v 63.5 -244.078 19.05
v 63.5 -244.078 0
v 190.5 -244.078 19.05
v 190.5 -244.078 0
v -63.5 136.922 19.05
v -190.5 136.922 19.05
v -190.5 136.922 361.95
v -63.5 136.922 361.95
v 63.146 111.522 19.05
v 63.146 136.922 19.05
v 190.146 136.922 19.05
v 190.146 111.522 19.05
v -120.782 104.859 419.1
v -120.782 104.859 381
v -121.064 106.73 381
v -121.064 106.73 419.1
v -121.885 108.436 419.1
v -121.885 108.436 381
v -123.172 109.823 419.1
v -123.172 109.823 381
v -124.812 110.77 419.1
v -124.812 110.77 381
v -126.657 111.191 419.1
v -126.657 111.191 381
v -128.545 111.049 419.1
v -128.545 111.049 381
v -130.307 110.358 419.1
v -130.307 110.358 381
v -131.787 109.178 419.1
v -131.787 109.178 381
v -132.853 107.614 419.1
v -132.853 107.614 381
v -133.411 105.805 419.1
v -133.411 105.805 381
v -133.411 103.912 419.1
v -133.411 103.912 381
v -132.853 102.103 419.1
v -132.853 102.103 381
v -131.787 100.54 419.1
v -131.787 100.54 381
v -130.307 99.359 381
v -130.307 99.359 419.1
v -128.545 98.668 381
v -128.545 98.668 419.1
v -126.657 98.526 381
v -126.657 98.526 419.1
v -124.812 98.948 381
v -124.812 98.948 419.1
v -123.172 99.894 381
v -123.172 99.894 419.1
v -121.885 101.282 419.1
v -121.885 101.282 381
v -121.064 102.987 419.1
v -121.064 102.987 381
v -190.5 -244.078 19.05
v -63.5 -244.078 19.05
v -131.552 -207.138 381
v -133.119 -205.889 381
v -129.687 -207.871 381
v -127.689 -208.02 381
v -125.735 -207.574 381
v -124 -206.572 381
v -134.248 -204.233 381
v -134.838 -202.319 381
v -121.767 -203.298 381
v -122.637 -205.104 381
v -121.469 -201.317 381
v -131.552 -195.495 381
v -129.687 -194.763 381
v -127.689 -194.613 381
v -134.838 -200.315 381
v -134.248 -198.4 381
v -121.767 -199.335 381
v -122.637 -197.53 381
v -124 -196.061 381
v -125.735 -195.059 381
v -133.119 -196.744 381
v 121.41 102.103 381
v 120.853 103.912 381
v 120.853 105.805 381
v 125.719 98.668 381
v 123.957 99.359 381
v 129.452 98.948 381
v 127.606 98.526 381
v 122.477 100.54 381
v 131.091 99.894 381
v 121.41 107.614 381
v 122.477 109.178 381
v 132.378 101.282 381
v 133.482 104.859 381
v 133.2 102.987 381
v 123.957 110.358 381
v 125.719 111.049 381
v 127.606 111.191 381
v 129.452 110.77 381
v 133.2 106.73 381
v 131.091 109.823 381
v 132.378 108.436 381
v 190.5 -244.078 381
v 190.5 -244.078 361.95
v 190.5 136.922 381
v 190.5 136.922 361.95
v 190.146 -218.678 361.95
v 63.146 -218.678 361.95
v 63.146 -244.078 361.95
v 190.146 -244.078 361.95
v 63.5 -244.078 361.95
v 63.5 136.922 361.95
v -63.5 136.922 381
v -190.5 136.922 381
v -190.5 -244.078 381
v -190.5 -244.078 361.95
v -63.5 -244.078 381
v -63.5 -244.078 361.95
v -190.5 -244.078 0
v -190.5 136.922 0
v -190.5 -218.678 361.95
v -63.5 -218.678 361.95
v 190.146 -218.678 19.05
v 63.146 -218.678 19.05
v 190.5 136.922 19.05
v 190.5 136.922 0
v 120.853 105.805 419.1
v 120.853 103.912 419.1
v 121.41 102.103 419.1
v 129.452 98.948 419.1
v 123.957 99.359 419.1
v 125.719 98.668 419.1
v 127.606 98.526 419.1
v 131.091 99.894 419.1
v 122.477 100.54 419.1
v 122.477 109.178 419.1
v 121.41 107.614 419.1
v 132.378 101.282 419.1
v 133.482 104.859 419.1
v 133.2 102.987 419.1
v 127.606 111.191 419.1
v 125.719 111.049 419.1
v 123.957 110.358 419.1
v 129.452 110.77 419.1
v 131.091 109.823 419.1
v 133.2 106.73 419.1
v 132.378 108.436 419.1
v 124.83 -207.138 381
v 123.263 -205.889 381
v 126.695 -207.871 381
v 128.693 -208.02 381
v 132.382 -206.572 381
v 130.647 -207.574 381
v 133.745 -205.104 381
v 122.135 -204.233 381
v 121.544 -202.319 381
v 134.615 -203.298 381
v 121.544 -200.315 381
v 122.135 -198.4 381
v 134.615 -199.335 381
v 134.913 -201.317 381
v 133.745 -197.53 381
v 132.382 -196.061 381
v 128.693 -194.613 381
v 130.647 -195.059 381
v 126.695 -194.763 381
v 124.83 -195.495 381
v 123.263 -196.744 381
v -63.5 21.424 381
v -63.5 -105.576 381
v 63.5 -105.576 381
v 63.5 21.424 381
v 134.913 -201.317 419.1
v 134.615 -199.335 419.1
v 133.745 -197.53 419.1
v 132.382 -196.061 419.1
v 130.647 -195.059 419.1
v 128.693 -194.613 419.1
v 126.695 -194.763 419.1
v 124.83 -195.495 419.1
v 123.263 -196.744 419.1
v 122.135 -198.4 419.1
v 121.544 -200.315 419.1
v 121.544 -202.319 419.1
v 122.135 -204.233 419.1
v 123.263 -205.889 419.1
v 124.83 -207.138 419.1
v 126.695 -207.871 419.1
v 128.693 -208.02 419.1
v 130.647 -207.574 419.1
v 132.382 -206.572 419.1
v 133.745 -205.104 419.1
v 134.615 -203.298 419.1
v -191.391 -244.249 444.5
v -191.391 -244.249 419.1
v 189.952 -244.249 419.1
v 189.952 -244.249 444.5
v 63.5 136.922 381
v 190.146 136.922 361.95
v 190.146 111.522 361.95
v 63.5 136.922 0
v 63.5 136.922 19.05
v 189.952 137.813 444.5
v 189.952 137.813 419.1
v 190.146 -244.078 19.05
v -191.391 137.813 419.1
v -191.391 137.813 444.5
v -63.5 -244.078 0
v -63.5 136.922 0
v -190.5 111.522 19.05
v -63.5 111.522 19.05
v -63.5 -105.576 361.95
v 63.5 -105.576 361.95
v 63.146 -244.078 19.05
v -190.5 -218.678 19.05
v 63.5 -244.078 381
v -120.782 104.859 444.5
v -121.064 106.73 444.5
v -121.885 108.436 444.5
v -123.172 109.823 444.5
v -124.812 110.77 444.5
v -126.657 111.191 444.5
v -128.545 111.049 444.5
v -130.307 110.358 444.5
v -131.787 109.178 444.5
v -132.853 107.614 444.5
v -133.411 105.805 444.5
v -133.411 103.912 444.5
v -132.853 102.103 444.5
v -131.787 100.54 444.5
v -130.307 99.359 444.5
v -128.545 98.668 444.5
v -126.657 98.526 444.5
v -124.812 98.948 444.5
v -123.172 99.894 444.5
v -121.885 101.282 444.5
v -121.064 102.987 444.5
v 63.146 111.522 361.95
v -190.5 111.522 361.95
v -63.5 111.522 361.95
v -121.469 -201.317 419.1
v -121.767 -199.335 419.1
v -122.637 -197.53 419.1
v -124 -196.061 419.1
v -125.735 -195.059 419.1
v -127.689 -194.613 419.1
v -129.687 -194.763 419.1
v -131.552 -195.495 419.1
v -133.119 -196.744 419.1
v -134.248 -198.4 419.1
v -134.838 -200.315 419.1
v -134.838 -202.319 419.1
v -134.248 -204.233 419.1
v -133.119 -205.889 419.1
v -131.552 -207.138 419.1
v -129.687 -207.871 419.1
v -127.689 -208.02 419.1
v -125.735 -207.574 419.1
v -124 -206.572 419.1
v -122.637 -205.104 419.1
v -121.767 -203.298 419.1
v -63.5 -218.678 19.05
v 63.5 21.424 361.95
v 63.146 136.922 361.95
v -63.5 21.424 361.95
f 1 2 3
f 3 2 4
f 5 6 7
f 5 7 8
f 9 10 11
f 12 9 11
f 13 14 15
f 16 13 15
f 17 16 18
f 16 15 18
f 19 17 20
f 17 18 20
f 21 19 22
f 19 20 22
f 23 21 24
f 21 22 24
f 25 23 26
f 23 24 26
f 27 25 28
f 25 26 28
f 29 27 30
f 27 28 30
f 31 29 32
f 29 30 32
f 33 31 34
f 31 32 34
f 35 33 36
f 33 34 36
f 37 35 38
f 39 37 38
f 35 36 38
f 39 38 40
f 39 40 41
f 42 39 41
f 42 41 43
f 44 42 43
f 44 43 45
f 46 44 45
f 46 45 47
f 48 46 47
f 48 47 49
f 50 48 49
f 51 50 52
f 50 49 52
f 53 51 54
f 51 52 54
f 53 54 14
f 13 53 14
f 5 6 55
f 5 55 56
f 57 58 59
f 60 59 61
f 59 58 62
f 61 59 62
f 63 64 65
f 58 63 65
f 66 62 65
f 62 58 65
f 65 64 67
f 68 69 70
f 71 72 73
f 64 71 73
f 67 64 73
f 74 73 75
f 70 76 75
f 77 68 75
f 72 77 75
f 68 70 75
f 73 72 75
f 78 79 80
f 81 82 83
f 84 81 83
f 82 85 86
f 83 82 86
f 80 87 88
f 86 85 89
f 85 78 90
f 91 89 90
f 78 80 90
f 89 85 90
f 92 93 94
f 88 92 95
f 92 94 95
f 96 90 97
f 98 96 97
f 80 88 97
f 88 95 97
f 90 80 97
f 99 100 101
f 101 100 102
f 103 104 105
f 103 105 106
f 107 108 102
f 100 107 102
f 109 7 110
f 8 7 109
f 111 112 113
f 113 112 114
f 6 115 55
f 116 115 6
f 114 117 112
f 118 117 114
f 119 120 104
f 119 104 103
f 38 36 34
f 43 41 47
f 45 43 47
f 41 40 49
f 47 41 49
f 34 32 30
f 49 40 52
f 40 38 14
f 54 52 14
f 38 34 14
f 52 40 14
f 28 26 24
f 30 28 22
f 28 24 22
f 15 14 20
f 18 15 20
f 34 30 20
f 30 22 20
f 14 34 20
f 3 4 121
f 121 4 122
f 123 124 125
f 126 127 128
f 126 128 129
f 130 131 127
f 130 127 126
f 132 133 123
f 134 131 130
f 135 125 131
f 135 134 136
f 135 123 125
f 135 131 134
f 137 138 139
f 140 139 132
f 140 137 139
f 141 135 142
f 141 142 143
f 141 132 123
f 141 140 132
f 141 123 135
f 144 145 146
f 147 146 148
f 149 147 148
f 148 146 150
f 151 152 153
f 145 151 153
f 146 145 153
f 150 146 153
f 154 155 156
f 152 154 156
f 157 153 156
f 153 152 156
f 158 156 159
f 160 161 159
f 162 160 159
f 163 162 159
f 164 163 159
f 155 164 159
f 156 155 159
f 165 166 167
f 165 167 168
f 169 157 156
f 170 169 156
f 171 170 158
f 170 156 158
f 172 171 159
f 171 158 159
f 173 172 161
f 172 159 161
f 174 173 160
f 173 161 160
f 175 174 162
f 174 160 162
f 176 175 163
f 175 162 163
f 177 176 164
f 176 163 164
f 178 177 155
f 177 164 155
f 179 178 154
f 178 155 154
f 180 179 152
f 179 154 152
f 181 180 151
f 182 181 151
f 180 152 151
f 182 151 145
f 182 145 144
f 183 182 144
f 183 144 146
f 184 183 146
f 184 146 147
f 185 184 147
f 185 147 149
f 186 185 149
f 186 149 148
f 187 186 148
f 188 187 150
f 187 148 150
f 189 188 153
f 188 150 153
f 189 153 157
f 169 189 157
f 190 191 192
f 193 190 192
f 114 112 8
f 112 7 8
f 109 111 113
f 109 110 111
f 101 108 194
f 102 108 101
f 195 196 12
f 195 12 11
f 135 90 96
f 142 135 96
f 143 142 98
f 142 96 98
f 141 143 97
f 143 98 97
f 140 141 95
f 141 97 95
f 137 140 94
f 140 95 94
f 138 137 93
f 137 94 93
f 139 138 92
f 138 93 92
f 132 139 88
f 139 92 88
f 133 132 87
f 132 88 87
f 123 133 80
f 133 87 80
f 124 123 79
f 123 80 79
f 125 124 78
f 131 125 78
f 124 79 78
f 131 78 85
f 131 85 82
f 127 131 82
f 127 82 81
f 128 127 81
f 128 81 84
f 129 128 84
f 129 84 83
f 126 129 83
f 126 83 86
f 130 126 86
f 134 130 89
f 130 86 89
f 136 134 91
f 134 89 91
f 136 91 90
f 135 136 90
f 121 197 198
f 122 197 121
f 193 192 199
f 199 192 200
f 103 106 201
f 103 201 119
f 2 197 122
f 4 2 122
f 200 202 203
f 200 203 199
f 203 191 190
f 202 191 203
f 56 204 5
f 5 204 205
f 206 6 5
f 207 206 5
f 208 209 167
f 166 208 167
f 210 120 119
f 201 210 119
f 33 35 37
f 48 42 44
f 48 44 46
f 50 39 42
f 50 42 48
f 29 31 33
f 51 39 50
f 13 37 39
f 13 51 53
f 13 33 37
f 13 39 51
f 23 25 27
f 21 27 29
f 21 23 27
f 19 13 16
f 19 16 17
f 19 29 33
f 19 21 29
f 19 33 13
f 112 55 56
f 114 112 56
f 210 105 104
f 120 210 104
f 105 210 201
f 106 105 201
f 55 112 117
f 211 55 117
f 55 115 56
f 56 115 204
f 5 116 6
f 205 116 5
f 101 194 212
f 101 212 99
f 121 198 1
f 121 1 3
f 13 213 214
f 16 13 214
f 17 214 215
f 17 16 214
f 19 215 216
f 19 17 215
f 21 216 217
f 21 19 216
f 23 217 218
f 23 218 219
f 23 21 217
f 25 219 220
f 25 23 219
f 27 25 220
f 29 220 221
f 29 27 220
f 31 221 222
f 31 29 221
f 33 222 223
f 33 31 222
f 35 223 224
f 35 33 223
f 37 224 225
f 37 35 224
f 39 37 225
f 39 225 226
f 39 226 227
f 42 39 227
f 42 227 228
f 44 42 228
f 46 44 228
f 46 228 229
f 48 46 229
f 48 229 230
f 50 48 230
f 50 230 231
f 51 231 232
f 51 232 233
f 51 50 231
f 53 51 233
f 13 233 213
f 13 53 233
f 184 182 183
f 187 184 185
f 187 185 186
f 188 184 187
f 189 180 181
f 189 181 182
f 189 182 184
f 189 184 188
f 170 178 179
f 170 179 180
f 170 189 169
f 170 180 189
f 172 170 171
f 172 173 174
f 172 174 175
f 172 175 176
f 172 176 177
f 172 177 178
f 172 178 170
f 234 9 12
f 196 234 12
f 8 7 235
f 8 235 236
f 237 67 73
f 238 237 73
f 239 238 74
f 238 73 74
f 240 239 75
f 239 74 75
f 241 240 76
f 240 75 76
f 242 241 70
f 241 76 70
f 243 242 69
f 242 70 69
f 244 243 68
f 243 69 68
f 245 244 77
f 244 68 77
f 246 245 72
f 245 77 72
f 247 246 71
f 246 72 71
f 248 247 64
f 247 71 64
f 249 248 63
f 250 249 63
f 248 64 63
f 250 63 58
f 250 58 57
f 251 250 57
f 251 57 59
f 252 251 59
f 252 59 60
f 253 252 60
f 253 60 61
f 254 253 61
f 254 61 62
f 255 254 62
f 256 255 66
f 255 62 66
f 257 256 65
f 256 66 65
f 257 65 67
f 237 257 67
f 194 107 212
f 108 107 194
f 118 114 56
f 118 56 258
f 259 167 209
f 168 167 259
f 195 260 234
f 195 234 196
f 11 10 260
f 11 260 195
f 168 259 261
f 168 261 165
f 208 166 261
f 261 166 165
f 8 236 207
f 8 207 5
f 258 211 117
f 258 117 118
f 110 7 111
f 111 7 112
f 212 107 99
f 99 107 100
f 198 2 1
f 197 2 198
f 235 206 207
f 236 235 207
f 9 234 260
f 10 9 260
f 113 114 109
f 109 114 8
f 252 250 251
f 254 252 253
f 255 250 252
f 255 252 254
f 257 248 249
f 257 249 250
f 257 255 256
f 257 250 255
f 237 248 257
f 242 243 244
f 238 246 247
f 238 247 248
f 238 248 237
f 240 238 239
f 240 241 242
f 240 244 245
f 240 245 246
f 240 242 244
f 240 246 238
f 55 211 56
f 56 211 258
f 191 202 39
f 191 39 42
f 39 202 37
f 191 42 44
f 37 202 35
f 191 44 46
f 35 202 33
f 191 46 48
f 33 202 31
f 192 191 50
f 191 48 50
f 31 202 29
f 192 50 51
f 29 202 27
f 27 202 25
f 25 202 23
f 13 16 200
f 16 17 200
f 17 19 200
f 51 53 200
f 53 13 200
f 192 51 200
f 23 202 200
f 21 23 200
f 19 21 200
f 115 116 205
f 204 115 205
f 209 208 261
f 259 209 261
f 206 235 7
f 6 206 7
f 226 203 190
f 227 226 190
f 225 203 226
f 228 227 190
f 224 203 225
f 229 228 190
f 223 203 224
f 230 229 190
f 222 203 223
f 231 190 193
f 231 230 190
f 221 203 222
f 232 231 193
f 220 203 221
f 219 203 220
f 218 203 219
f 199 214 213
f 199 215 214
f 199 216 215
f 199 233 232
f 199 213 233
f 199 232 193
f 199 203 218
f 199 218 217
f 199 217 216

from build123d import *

# Parameters (mm, degrees)
F0_W      = 127
F0_H      = 381
F1_DEPTH  = 19.05
F2_W      = 127
F2_H      = 25.4
F3_DEPTH  = 342.9
F4_W      = 127
F4_H      = 355.6
F4_H_2    = 25.4
F4_H_3    = 381
F5_DEPTH  = 19.05
F6_W      = 127
F6_H      = 19.05
F7_DEPTH  = 127
F8_R      = 6.35
F8_R_2    = 6.722273
F9_DEPTH  = 38.1
F10_W     = 381.342619
F10_H     = 382.062152
F10_R     = 6.35
F11_DEPTH = 25.4


with BuildPart() as f1:
    # F0 (on Top) → F1 (new body)
    with BuildSketch(Plane.XY):
        with Locations((-127, -53.578084)):
            Rectangle(F0_W, F0_H)
        with Locations((127, -53.578084)):
            Rectangle(F0_W, F0_H)
    extrude(amount=F1_DEPTH)


with BuildPart() as f3:
    # F2 (on face) → F3 (new body)
    with BuildSketch(Plane.XY.offset(19.05)):
        with Locations((-127, 124.221916)):
            Rectangle(F2_W, F2_H)
        with Locations((126.646167, 124.221916)):
            Rectangle(F2_W, F2_H)
        with Locations((126.646167, -231.378084)):
            Rectangle(F2_W, F2_H)
        with Locations((-127, -231.378084)):
            Rectangle(F2_W, F2_H)
    extrude(amount=F3_DEPTH)


with BuildPart() as f5:
    # F4 (on face) → F5 (new body)
    with BuildSketch(Plane.XY.offset(361.95)):
        with Locations((-127, -66.278084)):
            Rectangle(F4_W, F4_H)
        with Locations((-127, 124.221916)):
            Rectangle(F4_W, F4_H_2)
        with Locations((127, -53.578084)):
            Rectangle(F4_W, F4_H_3)
    extrude(amount=F5_DEPTH)


with BuildPart() as f7:
    # F6 (on face) → F7 (new body)
    with BuildSketch(Plane.YZ.offset(-63.5)):
        with Locations((-42.076344, 371.475)):
            Rectangle(F6_W, F6_H)
    extrude(amount=F7_DEPTH)


with BuildPart() as f9:
    # F8 (on face) → F9 (new body)
    with BuildSketch(Plane.XY.offset(381)):
        with Locations((-127.131641, 104.858607)):
            Circle(F8_R)
        with Locations((127.131641, 104.858607)):
            Circle(F8_R)
        with Locations((-128.191084, -201.316774)):
            Circle(F8_R_2)
        with Locations((128.191084, -201.316774)):
            Circle(F8_R_2)
    extrude(amount=F9_DEPTH)


with BuildPart() as f11:
    # F10 (on face) → F11 (new body)
    with BuildSketch(Plane.XY.offset(419.1)):
        with Locations((-0.719518, -53.218327)):
            Rectangle(F10_W, F10_H)
        with Locations((-127.131641, 104.858607)):
            Circle(F10_R, mode=Mode.SUBTRACT)
    extrude(amount=F11_DEPTH)


solid = Compound([f1.part, f3.part, f5.part, f7.part, f9.part, f11.part])
